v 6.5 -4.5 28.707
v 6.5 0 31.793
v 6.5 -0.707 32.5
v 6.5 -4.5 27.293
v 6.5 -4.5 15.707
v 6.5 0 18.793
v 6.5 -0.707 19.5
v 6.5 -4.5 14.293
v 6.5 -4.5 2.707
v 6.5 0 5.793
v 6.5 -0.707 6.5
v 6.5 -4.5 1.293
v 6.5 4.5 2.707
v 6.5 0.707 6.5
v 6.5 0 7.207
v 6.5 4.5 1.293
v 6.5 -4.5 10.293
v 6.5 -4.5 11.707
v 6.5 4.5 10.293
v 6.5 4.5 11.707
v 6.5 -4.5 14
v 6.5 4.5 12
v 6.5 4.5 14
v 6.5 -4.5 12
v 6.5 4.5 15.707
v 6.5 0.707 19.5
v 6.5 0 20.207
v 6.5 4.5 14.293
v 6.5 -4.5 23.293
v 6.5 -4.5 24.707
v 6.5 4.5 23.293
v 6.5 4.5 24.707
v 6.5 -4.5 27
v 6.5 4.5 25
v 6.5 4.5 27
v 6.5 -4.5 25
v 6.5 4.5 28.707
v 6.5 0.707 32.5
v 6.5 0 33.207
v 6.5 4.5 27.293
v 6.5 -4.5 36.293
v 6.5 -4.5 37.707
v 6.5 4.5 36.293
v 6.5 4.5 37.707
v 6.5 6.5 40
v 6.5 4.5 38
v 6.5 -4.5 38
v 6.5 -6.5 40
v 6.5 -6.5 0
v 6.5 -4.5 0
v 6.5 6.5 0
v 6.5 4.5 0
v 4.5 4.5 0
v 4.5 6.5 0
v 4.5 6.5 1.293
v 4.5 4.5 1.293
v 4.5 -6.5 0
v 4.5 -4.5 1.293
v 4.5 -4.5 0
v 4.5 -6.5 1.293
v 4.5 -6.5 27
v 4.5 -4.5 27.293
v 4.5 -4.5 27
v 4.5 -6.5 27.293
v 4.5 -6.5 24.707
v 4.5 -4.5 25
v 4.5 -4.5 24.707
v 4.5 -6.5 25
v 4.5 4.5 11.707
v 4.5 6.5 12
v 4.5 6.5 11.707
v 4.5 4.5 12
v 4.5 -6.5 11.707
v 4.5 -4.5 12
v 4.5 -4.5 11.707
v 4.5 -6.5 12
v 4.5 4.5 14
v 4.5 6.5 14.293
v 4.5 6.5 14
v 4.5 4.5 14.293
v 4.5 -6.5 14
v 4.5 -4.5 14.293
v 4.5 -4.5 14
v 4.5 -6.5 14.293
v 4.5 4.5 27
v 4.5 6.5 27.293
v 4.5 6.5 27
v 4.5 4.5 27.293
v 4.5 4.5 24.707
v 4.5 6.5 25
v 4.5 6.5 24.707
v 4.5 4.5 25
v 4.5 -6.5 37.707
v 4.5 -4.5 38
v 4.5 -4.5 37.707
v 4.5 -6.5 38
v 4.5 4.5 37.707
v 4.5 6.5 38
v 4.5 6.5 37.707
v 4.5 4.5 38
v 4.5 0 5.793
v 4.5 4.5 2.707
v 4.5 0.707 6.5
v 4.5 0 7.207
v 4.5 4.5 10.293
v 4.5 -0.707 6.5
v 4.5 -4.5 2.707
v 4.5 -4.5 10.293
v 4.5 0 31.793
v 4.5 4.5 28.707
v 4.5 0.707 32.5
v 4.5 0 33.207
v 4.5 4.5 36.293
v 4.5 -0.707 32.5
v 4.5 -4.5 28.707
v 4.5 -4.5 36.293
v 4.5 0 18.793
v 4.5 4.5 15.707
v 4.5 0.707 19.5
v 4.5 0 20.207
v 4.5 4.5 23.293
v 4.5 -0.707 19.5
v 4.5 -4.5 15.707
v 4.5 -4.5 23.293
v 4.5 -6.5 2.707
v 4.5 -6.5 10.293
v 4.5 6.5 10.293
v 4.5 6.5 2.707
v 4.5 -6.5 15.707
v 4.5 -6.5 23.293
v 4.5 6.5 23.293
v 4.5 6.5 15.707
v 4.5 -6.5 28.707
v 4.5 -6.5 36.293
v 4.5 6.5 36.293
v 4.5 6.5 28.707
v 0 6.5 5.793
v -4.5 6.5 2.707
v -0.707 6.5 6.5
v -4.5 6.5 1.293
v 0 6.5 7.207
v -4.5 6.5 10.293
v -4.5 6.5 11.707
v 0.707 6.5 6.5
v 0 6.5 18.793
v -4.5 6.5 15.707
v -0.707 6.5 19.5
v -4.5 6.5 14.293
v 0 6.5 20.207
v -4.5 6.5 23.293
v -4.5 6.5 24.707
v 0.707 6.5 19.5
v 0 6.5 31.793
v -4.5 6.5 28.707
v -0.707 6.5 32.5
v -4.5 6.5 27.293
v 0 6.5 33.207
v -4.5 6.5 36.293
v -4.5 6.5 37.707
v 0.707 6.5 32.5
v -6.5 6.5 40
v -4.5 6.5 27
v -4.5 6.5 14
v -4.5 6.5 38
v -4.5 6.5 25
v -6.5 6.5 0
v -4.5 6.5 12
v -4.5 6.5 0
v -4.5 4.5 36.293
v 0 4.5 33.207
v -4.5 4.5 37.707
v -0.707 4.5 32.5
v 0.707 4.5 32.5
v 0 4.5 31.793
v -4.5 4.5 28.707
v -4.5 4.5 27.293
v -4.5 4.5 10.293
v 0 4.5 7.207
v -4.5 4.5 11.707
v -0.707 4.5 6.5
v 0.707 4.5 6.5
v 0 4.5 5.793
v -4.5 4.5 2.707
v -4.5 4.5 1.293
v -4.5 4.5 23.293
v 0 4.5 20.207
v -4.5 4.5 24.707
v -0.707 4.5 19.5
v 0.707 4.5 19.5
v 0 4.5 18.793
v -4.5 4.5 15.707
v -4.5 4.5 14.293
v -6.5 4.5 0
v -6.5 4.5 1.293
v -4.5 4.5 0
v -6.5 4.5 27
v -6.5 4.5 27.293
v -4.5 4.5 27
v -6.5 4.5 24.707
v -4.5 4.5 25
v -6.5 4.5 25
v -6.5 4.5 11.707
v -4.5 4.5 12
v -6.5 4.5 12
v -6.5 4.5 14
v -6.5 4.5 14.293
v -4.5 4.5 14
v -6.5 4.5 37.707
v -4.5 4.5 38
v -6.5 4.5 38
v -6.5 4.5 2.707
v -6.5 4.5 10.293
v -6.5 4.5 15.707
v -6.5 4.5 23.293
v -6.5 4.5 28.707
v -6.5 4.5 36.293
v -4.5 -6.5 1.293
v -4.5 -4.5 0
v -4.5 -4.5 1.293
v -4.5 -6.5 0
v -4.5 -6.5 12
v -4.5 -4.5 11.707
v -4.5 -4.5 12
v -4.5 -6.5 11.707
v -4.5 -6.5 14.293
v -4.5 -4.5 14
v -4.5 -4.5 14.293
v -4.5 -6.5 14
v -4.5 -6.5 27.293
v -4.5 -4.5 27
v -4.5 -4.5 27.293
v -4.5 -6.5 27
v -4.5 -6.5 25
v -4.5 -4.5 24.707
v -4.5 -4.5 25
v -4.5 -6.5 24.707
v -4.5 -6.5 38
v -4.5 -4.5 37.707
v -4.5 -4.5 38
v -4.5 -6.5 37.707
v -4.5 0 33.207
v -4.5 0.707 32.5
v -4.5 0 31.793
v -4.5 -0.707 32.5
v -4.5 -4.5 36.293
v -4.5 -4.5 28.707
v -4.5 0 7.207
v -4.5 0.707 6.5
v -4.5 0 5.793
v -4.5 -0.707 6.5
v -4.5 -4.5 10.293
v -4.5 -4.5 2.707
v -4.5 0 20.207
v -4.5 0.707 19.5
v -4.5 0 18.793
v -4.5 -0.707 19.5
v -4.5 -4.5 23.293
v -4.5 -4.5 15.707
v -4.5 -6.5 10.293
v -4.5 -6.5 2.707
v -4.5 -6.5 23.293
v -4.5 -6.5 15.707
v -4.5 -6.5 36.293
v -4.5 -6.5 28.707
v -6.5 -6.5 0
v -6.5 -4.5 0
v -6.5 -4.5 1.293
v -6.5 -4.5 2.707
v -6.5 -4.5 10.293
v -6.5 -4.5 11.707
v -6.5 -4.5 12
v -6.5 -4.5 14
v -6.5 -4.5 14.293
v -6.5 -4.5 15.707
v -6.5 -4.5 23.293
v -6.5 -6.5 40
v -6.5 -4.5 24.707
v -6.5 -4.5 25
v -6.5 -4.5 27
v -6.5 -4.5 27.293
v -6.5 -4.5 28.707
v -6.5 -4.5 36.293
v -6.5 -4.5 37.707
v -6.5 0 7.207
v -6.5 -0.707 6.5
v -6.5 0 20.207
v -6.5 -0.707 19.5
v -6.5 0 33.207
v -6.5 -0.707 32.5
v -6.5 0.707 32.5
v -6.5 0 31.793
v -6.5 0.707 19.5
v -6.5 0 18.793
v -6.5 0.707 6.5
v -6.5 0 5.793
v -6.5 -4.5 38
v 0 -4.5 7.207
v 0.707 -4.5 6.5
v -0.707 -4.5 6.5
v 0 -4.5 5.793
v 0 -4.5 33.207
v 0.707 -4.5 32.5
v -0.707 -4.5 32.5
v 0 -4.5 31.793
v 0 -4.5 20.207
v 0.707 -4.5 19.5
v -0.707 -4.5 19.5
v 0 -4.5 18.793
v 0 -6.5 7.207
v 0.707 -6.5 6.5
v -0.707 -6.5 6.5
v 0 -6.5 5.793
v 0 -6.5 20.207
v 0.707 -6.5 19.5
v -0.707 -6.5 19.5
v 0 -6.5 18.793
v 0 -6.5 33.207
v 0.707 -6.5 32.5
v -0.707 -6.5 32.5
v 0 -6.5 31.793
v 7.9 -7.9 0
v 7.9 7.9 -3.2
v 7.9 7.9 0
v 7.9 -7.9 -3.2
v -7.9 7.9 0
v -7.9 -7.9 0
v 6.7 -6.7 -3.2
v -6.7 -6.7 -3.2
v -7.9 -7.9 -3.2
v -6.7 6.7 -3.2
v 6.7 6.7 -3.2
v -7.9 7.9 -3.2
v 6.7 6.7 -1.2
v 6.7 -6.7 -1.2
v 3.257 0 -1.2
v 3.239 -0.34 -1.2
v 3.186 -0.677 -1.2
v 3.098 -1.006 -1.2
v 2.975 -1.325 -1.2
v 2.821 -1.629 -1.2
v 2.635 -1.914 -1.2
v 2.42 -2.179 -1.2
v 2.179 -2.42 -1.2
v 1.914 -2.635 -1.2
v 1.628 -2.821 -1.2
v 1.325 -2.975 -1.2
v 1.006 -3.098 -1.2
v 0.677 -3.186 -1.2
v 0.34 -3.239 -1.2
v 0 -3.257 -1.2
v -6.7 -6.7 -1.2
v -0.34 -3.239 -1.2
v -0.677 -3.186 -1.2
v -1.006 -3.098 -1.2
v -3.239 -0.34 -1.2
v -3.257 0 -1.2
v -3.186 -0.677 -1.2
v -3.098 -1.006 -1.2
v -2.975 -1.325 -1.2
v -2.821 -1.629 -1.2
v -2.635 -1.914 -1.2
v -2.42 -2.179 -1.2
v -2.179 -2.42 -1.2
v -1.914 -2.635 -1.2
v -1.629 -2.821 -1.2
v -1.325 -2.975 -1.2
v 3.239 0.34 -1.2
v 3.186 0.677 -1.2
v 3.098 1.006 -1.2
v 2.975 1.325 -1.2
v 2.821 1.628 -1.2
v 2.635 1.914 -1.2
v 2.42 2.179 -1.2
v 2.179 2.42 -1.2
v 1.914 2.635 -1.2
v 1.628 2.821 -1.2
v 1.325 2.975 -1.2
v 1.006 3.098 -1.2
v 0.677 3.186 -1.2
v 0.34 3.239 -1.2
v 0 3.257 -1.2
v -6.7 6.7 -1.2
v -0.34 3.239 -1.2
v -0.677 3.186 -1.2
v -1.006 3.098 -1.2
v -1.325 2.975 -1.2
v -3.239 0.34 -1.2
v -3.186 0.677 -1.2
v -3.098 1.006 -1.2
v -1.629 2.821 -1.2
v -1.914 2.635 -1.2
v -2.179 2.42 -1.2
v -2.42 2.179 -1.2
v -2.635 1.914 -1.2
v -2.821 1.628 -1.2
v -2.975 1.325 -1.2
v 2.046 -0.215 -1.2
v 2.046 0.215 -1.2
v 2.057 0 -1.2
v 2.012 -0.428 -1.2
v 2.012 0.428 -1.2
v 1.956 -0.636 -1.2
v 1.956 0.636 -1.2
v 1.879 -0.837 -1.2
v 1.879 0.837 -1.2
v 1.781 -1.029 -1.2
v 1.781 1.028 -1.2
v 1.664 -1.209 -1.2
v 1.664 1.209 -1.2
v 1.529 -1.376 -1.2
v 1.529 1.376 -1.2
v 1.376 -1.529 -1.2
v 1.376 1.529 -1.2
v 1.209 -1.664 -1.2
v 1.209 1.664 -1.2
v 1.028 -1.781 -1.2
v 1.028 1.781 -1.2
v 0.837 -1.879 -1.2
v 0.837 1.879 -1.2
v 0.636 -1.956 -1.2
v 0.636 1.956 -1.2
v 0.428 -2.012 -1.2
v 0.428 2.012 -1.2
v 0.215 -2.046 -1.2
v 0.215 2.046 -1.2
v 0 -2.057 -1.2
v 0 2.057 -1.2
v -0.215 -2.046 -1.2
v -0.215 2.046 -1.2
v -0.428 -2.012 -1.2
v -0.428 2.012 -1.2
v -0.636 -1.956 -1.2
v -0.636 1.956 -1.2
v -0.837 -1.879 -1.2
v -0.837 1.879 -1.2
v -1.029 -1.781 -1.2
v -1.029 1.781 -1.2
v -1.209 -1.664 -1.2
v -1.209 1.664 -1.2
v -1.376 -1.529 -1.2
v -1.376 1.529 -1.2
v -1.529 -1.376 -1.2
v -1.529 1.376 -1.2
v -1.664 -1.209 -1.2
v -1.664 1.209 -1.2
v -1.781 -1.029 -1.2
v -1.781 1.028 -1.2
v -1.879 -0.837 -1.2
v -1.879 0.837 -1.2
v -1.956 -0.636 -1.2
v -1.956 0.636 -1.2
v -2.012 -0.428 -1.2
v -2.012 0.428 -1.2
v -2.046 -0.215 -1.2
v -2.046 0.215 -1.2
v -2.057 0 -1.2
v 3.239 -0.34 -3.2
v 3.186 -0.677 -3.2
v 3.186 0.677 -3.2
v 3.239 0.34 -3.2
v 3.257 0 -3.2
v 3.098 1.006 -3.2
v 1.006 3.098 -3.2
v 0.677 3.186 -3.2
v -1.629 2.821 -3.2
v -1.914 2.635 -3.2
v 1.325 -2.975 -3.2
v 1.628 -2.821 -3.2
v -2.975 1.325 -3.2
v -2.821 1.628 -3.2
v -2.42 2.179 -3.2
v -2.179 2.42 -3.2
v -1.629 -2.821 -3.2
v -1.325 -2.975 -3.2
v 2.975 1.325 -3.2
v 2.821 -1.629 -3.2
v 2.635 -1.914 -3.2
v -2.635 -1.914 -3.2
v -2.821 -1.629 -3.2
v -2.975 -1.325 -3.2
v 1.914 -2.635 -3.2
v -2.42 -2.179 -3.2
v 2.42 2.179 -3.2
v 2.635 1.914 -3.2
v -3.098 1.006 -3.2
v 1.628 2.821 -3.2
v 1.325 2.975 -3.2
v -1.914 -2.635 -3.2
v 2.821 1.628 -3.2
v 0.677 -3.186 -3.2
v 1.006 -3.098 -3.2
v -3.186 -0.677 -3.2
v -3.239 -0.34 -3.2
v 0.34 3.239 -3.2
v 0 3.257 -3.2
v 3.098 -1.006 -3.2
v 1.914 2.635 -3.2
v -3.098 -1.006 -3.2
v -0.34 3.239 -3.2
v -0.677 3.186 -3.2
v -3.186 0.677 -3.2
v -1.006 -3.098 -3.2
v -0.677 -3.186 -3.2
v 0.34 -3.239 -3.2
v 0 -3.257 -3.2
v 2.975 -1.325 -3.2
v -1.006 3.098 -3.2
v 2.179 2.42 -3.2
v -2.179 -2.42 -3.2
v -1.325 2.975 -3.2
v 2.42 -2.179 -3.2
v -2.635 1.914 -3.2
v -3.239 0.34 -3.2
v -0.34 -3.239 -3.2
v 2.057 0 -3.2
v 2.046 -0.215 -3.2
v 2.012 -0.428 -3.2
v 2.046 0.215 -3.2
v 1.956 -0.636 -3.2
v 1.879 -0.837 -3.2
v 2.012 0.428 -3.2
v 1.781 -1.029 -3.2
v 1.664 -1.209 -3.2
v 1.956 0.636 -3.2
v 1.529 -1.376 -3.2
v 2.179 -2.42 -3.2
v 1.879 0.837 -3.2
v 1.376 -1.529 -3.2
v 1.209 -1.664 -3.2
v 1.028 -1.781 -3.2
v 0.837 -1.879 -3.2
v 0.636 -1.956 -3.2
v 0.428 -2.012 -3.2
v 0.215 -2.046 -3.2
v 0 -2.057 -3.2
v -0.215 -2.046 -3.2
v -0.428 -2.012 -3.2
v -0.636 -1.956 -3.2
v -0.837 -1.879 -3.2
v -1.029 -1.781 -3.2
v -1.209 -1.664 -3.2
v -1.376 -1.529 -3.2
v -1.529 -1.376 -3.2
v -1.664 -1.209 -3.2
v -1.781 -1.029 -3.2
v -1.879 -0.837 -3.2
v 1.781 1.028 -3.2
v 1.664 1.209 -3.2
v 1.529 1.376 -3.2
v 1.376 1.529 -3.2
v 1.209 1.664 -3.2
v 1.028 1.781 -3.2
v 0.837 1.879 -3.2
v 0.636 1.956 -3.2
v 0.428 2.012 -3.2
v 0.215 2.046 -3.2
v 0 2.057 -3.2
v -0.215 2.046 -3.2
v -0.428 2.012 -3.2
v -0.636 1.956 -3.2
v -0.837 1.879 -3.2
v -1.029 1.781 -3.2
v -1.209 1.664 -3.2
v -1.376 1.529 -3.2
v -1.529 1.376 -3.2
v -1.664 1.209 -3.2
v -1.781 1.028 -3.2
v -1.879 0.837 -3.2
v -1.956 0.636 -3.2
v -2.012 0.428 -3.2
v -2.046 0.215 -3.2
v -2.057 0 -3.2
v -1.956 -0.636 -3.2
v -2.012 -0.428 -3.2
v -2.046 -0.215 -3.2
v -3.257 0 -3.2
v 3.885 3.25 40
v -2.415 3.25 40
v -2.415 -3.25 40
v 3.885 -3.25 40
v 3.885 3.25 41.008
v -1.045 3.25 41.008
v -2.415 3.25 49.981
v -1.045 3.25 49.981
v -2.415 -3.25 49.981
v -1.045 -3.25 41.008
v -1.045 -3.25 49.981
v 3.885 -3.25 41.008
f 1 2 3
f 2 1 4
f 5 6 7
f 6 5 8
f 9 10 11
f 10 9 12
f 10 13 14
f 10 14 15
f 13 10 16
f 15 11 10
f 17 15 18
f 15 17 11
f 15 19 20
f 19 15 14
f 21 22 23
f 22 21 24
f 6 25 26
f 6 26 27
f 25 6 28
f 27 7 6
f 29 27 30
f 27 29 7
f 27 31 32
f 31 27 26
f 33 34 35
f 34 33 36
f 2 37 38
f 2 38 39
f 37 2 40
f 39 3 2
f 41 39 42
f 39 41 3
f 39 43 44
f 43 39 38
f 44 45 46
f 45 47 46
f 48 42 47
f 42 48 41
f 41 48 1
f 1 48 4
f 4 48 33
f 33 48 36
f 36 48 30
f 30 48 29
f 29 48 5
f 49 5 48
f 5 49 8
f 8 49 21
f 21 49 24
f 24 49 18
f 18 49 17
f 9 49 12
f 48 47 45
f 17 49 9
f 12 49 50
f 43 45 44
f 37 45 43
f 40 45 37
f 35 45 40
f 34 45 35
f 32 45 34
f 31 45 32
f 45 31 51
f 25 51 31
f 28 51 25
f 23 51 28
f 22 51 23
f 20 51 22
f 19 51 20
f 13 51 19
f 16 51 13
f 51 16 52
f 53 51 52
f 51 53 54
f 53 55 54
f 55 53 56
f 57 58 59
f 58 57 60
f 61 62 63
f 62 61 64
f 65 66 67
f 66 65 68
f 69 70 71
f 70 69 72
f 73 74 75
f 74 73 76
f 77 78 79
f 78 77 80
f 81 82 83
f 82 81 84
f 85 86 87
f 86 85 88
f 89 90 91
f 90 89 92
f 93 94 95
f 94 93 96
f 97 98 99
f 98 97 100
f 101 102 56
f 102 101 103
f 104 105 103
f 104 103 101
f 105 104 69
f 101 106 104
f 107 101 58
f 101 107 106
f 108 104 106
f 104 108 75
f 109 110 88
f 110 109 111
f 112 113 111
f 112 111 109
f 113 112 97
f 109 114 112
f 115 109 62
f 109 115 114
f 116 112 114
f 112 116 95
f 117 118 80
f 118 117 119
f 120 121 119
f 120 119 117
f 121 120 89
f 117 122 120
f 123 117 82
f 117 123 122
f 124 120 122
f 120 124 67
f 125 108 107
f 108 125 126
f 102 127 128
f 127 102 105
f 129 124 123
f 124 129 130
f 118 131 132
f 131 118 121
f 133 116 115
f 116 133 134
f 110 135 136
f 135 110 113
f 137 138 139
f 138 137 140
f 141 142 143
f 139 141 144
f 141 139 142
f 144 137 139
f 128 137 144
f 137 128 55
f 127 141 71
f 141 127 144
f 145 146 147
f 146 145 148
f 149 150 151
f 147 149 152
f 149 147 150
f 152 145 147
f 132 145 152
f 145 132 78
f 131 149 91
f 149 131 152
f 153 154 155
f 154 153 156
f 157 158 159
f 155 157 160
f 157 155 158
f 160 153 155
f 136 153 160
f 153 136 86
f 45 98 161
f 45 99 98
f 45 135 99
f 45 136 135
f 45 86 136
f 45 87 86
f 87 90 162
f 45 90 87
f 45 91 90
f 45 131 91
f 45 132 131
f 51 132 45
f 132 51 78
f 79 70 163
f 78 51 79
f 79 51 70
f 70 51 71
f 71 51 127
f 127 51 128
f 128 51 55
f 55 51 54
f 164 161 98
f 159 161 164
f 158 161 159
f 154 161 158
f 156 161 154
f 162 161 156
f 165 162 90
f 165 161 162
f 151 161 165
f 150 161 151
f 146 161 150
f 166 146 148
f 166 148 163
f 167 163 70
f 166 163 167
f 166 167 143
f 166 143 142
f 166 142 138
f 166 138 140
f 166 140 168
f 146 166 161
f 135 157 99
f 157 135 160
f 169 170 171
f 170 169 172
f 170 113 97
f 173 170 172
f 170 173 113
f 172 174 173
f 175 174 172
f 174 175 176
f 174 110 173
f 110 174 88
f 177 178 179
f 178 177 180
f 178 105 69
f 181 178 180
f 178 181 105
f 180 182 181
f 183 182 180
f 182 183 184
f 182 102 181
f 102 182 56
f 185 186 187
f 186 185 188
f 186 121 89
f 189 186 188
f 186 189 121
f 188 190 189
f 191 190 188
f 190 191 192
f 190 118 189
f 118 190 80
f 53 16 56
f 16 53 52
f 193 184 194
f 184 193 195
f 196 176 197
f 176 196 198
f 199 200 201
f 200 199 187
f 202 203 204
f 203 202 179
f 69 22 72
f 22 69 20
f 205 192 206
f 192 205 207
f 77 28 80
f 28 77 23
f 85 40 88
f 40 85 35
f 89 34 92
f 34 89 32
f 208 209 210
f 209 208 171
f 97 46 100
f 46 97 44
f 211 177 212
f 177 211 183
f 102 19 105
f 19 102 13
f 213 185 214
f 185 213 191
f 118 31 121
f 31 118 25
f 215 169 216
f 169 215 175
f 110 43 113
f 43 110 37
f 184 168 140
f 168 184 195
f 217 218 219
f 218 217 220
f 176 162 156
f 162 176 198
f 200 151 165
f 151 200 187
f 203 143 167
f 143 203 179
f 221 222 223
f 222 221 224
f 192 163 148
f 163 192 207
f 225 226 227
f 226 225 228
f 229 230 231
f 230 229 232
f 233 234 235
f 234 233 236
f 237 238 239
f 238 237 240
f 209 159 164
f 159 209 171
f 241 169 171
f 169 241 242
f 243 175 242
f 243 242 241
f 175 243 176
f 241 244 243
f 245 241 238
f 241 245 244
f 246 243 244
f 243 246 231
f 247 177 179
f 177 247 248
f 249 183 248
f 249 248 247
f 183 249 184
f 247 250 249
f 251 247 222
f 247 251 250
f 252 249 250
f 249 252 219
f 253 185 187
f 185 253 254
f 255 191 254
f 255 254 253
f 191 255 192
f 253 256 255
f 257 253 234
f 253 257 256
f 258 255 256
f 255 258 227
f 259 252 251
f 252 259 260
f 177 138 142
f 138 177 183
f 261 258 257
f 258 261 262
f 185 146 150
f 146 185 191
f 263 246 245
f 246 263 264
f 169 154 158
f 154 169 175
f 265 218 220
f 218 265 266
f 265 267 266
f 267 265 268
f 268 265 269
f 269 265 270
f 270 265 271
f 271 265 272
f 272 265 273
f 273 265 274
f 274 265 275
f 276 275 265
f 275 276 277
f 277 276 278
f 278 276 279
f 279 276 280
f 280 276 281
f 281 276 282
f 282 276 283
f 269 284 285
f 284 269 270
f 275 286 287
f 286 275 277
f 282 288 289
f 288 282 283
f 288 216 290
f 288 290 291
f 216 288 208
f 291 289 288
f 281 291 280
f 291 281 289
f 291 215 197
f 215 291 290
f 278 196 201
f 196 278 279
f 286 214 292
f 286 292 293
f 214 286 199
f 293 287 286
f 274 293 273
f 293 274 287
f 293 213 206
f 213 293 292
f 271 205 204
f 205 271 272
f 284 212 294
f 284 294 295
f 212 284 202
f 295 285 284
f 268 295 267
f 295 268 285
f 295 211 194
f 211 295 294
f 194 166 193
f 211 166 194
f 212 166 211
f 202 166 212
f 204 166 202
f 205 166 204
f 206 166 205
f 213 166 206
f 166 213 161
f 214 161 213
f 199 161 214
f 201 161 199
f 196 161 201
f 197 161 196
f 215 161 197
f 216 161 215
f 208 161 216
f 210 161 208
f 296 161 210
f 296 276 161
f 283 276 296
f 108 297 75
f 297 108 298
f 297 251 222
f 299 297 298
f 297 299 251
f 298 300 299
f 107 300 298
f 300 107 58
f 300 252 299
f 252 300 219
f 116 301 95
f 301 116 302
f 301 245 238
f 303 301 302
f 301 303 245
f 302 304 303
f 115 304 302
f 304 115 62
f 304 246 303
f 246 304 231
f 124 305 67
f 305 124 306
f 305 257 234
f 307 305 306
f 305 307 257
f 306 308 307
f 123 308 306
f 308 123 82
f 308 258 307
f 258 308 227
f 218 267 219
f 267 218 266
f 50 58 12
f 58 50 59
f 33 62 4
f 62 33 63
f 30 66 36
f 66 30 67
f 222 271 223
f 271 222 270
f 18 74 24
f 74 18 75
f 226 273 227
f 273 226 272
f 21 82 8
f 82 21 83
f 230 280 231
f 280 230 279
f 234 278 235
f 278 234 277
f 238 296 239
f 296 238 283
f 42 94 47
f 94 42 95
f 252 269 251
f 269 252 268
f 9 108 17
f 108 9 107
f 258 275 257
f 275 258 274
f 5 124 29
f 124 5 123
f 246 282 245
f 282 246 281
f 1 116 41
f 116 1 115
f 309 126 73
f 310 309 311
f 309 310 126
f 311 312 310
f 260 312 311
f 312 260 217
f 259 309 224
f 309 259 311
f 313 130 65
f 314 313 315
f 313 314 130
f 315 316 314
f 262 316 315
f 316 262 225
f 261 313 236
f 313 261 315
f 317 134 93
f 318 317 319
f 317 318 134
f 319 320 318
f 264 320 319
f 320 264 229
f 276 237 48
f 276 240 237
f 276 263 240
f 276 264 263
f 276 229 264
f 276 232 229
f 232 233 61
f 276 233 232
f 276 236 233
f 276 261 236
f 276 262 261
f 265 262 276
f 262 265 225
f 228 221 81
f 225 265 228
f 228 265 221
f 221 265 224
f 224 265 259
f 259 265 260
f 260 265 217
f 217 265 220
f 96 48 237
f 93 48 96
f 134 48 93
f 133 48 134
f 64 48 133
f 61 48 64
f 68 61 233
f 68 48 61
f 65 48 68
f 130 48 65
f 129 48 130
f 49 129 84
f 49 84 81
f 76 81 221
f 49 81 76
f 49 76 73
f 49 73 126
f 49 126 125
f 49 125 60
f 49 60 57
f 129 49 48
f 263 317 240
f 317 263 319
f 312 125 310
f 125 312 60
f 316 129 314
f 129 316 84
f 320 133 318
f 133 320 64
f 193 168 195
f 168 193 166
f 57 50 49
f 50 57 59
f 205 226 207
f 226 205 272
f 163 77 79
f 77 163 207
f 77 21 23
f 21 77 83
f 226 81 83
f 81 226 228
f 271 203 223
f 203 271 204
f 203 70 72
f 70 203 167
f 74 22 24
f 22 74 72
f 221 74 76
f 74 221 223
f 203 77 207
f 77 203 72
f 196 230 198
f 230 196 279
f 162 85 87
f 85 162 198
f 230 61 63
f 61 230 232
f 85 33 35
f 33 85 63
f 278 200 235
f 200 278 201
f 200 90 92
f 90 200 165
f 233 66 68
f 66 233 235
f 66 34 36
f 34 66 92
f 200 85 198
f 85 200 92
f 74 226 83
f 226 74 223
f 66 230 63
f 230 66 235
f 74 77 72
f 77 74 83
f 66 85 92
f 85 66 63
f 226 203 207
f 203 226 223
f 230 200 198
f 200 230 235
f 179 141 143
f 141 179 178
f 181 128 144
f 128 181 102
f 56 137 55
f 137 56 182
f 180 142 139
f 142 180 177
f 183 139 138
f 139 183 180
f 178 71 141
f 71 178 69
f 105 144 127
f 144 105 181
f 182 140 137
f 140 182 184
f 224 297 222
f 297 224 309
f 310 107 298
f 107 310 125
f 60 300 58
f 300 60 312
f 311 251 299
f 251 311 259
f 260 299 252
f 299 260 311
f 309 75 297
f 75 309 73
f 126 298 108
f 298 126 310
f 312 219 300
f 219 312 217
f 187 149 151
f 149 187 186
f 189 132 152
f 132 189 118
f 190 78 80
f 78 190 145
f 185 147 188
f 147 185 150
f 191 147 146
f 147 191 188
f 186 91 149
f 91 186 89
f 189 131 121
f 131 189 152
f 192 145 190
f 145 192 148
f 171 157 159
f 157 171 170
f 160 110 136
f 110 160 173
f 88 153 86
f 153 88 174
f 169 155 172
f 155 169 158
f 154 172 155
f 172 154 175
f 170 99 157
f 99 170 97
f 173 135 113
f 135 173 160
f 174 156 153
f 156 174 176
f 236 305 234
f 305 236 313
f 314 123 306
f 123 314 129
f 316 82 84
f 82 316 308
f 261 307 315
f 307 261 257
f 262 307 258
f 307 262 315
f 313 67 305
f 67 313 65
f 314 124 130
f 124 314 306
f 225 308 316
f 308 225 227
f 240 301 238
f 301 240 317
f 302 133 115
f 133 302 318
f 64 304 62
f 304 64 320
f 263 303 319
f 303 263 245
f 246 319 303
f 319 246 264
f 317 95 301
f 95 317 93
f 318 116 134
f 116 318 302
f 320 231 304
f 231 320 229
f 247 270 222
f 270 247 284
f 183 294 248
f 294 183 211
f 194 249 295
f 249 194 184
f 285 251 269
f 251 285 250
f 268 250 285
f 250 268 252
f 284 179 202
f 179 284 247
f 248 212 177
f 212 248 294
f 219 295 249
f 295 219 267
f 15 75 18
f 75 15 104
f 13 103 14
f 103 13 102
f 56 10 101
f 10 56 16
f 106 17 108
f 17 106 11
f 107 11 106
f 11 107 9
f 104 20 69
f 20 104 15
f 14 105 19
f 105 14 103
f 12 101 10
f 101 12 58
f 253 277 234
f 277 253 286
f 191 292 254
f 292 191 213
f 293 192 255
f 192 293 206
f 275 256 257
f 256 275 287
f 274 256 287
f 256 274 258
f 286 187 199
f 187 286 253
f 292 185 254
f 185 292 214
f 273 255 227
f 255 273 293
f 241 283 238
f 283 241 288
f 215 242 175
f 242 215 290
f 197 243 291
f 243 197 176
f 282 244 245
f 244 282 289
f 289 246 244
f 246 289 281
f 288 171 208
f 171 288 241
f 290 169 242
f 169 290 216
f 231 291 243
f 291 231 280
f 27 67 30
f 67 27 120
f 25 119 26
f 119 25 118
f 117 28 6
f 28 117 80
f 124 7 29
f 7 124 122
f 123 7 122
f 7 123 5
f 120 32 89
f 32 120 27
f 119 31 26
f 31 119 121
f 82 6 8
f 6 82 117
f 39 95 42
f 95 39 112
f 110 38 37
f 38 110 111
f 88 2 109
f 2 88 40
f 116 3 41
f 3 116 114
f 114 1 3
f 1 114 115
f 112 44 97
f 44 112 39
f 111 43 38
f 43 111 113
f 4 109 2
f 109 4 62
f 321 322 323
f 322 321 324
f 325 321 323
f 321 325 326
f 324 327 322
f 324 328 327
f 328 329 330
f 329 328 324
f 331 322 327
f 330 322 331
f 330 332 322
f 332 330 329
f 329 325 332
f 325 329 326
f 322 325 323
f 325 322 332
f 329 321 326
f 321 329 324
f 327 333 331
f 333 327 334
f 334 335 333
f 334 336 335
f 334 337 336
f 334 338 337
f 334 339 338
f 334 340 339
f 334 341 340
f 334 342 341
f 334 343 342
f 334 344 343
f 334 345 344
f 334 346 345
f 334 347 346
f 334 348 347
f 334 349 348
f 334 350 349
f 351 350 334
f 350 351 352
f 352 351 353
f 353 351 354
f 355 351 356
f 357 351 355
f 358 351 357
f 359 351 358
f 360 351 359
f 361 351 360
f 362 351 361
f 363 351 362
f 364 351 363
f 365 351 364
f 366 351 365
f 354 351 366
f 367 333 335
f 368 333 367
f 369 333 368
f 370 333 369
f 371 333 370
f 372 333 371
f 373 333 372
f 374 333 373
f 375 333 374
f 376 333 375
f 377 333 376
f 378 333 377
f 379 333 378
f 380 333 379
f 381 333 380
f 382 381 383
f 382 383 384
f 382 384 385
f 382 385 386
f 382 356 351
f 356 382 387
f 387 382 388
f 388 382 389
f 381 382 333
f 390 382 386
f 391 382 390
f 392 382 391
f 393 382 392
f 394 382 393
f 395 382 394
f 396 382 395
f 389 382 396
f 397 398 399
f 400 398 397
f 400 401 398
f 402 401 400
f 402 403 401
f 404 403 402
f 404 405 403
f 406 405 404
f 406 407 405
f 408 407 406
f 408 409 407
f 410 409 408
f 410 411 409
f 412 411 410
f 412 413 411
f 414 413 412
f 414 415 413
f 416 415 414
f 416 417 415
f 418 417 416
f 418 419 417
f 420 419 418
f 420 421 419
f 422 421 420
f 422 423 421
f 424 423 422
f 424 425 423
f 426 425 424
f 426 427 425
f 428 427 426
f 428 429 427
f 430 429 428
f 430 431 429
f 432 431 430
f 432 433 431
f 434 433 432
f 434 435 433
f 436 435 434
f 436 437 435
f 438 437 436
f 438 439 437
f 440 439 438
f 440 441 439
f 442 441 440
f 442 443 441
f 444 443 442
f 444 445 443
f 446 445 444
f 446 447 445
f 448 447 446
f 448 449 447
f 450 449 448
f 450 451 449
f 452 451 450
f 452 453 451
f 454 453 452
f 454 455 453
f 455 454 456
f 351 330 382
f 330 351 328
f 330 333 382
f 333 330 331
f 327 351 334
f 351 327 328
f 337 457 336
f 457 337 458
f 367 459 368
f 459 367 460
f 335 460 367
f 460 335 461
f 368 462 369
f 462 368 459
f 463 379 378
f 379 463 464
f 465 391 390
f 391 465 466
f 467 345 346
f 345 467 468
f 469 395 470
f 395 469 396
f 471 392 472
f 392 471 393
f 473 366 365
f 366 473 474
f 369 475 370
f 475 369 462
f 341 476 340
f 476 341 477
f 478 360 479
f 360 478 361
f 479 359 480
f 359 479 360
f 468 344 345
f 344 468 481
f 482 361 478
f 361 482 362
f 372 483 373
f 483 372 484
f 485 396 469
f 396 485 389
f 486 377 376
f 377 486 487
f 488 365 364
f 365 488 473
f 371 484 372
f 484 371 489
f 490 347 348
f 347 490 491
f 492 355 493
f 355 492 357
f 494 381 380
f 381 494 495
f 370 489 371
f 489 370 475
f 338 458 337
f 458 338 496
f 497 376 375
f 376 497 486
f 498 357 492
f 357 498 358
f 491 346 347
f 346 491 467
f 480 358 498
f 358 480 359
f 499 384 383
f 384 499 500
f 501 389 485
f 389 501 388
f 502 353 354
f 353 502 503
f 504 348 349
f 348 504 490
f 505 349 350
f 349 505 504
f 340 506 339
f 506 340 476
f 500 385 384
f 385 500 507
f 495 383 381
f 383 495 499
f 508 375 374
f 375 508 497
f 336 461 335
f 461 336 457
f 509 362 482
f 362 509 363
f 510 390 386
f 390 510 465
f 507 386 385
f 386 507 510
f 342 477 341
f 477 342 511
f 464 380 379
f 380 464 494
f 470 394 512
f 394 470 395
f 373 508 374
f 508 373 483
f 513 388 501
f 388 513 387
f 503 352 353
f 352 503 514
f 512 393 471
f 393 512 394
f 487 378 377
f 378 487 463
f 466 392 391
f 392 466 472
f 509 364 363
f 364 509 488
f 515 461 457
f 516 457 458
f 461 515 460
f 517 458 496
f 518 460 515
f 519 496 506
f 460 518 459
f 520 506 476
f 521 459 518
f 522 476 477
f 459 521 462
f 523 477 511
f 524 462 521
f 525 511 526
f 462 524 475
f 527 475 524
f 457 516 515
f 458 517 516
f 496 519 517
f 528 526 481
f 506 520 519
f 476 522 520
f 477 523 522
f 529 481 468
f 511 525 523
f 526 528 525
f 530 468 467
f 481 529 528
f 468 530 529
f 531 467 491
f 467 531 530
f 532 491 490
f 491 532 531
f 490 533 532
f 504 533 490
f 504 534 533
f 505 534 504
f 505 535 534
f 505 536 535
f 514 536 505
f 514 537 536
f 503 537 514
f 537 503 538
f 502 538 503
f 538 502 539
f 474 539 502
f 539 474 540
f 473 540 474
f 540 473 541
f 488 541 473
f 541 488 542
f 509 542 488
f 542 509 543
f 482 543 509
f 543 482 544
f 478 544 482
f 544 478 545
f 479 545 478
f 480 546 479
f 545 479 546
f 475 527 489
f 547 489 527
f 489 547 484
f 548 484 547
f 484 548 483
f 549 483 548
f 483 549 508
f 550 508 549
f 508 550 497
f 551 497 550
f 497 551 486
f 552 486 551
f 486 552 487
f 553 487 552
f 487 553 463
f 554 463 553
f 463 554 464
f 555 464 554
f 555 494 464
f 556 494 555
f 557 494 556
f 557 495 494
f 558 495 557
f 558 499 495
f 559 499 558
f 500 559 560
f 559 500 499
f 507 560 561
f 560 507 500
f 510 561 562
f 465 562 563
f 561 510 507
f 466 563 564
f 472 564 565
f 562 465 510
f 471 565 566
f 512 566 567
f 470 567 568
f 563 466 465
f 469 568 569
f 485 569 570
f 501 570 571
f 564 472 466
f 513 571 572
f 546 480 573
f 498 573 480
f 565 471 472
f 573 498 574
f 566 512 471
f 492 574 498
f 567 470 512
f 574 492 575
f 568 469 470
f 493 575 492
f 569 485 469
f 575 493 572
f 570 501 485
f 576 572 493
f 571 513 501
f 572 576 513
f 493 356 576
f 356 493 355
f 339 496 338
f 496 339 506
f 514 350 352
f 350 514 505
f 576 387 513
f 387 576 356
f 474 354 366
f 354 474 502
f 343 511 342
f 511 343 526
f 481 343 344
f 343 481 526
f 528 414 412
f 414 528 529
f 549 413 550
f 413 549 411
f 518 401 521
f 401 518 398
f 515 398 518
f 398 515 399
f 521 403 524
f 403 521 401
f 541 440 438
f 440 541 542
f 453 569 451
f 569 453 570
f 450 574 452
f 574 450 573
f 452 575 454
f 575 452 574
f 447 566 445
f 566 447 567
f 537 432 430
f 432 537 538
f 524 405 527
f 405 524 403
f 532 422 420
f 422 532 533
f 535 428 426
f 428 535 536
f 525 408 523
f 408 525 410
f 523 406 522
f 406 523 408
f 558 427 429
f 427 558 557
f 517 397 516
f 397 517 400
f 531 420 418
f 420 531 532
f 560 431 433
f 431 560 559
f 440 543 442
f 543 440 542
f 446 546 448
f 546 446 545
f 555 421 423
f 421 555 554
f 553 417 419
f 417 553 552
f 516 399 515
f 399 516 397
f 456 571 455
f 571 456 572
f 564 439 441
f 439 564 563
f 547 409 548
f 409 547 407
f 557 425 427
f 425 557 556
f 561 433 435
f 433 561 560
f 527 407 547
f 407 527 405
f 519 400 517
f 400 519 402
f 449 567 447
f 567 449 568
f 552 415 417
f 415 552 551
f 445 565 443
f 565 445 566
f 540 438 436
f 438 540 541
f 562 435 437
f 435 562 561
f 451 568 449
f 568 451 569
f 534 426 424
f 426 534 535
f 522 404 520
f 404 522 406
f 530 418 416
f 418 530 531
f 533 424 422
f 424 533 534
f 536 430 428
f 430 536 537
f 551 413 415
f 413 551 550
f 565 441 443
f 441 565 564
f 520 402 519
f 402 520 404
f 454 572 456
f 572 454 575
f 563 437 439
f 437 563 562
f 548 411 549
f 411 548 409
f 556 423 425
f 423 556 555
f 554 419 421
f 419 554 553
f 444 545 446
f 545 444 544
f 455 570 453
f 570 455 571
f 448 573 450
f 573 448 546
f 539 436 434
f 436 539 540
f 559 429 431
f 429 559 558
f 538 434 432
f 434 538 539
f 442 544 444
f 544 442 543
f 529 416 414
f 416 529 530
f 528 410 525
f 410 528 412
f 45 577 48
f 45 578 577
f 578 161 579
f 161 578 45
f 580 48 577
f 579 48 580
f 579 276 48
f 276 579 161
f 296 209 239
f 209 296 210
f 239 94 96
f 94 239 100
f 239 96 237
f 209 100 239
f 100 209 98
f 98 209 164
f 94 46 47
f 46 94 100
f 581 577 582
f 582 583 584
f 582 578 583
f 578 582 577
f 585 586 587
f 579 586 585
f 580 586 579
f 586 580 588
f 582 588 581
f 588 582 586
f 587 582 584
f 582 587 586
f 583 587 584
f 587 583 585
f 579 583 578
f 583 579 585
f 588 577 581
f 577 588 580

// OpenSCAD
// file: LegoBase.scad
$fn = 60;
rOuter = 3.257;
rInner = 2.057;
bOuter = 15.8;
bInner = 13.4;
bOuterZ = 3.2;
bInnerZ = 2;

bInnerOffset = (bOuter-bInner)/2;
boxCenter = bOuter/2;


module LegoBase() {
translate([-bOuter/2, -bOuter/2, -bOuterZ])
    {
    difference() {
        cube([bOuter,bOuter,bOuterZ]);
        translate([bInnerOffset,bInnerOffset,0]) cube([bInner,bInner,bInnerZ]);
    };

    difference() {
        translate([boxCenter,boxCenter,0]) cylinder(h=bInnerZ, r=rOuter);
        translate([boxCenter,boxCenter,0]) cylinder(h=bInnerZ, r=rInner);
    };
}
}
// main file
include <LegoBase.scad>
topLabel = "L";
towerBaseX = 16;
towerBaseY = 16;
towerBaseZ = 3;
towerX = 13;
towerY = 13;
towerZ = 39;
towerPosts = 2;
postOffset = (towerX/2)-towerPosts/2;
segZ = ((towerZ)/3);
echo(segZ);
fontHeight = 10;


//cube([towerBaseX, towerBaseY, towerBaseZ], center=true);

translate([0,0,towerZ]) {
    cube([towerX, towerY, towerPosts], center=true);
}

towerLegs();
towerHorizontal();
towerCrosses();
rotate(90) towerCrosses();
translate([0,towerY/4,(towerPosts/2+towerZ+fontHeight/2)-.2]) topText(topLabel);

module topText(label) {
    rotate([90,0,0]) {
        linear_extrude(height = towerX/2) {
            text(label, size=fontHeight, font="Arial Black:Style=bold", halign="center", valign="center");
        }
    }
}

module towerCrosses() {
    translate([0,postOffset,segZ/2]) towerCross();
    translate([0,-postOffset,segZ/2]) towerCross();
    translate([0,postOffset,(segZ/2)*3]) towerCross();
    translate([0,postOffset,(segZ/2)*5]) towerCross();
    translate([0,-postOffset,(segZ/2)*3]) towerCross();
    translate([0,-postOffset,(segZ/2)*5]) towerCross();
}

module towerCross() {
    rotate([0,45,0]) {
        cube([towerX+1.5, towerPosts, towerPosts/2], center=true);
    }
    rotate([0,-45,0]) {
        cube([towerX+1.5, towerPosts, towerPosts/2], center=true);
    }
}



module towerLegs() {
    translate([postOffset, postOffset,towerZ/2]) {
        cube([towerPosts, towerPosts, towerZ], center=true);
    }
    translate([-postOffset, -postOffset,towerZ/2]) {
        cube([towerPosts, towerPosts, towerZ], center=true);
    }
    translate([-postOffset, postOffset,towerZ/2]) {
        cube([towerPosts, towerPosts, towerZ], center=true);
    }
    translate([postOffset, -postOffset,towerZ/2]) {
        cube([towerPosts, towerPosts, towerZ], center=true);
    }
}

module towerHorizontal() {
        
    translate([0,postOffset,segZ]) {
        cube([towerX, towerPosts, towerPosts], center=true);
    }
    translate([0,postOffset,segZ*2]) {
        cube([towerX, towerPosts, towerPosts], center=true);
    }

    translate([0,-postOffset,segZ]) {
        cube([towerX, towerPosts, towerPosts], center=true);
    }
    translate([0,-postOffset,segZ*2]) {
        cube([towerX, towerPosts, towerPosts], center=true);
    }

    translate([postOffset, 0,segZ]) {
        cube([towerPosts, towerY, towerPosts], center=true);
    }
    translate([postOffset, 0,segZ*2]) {
        cube([towerPosts, towerY, towerPosts], center=true);
    }

    translate([-postOffset, 0,segZ]) {
        cube([towerPosts, towerY, towerPosts], center=true);
    }
    translate([-postOffset, 0,segZ*2]) {
        cube([towerPosts, towerY, towerPosts], center=true);
    }
}
LegoBase();
